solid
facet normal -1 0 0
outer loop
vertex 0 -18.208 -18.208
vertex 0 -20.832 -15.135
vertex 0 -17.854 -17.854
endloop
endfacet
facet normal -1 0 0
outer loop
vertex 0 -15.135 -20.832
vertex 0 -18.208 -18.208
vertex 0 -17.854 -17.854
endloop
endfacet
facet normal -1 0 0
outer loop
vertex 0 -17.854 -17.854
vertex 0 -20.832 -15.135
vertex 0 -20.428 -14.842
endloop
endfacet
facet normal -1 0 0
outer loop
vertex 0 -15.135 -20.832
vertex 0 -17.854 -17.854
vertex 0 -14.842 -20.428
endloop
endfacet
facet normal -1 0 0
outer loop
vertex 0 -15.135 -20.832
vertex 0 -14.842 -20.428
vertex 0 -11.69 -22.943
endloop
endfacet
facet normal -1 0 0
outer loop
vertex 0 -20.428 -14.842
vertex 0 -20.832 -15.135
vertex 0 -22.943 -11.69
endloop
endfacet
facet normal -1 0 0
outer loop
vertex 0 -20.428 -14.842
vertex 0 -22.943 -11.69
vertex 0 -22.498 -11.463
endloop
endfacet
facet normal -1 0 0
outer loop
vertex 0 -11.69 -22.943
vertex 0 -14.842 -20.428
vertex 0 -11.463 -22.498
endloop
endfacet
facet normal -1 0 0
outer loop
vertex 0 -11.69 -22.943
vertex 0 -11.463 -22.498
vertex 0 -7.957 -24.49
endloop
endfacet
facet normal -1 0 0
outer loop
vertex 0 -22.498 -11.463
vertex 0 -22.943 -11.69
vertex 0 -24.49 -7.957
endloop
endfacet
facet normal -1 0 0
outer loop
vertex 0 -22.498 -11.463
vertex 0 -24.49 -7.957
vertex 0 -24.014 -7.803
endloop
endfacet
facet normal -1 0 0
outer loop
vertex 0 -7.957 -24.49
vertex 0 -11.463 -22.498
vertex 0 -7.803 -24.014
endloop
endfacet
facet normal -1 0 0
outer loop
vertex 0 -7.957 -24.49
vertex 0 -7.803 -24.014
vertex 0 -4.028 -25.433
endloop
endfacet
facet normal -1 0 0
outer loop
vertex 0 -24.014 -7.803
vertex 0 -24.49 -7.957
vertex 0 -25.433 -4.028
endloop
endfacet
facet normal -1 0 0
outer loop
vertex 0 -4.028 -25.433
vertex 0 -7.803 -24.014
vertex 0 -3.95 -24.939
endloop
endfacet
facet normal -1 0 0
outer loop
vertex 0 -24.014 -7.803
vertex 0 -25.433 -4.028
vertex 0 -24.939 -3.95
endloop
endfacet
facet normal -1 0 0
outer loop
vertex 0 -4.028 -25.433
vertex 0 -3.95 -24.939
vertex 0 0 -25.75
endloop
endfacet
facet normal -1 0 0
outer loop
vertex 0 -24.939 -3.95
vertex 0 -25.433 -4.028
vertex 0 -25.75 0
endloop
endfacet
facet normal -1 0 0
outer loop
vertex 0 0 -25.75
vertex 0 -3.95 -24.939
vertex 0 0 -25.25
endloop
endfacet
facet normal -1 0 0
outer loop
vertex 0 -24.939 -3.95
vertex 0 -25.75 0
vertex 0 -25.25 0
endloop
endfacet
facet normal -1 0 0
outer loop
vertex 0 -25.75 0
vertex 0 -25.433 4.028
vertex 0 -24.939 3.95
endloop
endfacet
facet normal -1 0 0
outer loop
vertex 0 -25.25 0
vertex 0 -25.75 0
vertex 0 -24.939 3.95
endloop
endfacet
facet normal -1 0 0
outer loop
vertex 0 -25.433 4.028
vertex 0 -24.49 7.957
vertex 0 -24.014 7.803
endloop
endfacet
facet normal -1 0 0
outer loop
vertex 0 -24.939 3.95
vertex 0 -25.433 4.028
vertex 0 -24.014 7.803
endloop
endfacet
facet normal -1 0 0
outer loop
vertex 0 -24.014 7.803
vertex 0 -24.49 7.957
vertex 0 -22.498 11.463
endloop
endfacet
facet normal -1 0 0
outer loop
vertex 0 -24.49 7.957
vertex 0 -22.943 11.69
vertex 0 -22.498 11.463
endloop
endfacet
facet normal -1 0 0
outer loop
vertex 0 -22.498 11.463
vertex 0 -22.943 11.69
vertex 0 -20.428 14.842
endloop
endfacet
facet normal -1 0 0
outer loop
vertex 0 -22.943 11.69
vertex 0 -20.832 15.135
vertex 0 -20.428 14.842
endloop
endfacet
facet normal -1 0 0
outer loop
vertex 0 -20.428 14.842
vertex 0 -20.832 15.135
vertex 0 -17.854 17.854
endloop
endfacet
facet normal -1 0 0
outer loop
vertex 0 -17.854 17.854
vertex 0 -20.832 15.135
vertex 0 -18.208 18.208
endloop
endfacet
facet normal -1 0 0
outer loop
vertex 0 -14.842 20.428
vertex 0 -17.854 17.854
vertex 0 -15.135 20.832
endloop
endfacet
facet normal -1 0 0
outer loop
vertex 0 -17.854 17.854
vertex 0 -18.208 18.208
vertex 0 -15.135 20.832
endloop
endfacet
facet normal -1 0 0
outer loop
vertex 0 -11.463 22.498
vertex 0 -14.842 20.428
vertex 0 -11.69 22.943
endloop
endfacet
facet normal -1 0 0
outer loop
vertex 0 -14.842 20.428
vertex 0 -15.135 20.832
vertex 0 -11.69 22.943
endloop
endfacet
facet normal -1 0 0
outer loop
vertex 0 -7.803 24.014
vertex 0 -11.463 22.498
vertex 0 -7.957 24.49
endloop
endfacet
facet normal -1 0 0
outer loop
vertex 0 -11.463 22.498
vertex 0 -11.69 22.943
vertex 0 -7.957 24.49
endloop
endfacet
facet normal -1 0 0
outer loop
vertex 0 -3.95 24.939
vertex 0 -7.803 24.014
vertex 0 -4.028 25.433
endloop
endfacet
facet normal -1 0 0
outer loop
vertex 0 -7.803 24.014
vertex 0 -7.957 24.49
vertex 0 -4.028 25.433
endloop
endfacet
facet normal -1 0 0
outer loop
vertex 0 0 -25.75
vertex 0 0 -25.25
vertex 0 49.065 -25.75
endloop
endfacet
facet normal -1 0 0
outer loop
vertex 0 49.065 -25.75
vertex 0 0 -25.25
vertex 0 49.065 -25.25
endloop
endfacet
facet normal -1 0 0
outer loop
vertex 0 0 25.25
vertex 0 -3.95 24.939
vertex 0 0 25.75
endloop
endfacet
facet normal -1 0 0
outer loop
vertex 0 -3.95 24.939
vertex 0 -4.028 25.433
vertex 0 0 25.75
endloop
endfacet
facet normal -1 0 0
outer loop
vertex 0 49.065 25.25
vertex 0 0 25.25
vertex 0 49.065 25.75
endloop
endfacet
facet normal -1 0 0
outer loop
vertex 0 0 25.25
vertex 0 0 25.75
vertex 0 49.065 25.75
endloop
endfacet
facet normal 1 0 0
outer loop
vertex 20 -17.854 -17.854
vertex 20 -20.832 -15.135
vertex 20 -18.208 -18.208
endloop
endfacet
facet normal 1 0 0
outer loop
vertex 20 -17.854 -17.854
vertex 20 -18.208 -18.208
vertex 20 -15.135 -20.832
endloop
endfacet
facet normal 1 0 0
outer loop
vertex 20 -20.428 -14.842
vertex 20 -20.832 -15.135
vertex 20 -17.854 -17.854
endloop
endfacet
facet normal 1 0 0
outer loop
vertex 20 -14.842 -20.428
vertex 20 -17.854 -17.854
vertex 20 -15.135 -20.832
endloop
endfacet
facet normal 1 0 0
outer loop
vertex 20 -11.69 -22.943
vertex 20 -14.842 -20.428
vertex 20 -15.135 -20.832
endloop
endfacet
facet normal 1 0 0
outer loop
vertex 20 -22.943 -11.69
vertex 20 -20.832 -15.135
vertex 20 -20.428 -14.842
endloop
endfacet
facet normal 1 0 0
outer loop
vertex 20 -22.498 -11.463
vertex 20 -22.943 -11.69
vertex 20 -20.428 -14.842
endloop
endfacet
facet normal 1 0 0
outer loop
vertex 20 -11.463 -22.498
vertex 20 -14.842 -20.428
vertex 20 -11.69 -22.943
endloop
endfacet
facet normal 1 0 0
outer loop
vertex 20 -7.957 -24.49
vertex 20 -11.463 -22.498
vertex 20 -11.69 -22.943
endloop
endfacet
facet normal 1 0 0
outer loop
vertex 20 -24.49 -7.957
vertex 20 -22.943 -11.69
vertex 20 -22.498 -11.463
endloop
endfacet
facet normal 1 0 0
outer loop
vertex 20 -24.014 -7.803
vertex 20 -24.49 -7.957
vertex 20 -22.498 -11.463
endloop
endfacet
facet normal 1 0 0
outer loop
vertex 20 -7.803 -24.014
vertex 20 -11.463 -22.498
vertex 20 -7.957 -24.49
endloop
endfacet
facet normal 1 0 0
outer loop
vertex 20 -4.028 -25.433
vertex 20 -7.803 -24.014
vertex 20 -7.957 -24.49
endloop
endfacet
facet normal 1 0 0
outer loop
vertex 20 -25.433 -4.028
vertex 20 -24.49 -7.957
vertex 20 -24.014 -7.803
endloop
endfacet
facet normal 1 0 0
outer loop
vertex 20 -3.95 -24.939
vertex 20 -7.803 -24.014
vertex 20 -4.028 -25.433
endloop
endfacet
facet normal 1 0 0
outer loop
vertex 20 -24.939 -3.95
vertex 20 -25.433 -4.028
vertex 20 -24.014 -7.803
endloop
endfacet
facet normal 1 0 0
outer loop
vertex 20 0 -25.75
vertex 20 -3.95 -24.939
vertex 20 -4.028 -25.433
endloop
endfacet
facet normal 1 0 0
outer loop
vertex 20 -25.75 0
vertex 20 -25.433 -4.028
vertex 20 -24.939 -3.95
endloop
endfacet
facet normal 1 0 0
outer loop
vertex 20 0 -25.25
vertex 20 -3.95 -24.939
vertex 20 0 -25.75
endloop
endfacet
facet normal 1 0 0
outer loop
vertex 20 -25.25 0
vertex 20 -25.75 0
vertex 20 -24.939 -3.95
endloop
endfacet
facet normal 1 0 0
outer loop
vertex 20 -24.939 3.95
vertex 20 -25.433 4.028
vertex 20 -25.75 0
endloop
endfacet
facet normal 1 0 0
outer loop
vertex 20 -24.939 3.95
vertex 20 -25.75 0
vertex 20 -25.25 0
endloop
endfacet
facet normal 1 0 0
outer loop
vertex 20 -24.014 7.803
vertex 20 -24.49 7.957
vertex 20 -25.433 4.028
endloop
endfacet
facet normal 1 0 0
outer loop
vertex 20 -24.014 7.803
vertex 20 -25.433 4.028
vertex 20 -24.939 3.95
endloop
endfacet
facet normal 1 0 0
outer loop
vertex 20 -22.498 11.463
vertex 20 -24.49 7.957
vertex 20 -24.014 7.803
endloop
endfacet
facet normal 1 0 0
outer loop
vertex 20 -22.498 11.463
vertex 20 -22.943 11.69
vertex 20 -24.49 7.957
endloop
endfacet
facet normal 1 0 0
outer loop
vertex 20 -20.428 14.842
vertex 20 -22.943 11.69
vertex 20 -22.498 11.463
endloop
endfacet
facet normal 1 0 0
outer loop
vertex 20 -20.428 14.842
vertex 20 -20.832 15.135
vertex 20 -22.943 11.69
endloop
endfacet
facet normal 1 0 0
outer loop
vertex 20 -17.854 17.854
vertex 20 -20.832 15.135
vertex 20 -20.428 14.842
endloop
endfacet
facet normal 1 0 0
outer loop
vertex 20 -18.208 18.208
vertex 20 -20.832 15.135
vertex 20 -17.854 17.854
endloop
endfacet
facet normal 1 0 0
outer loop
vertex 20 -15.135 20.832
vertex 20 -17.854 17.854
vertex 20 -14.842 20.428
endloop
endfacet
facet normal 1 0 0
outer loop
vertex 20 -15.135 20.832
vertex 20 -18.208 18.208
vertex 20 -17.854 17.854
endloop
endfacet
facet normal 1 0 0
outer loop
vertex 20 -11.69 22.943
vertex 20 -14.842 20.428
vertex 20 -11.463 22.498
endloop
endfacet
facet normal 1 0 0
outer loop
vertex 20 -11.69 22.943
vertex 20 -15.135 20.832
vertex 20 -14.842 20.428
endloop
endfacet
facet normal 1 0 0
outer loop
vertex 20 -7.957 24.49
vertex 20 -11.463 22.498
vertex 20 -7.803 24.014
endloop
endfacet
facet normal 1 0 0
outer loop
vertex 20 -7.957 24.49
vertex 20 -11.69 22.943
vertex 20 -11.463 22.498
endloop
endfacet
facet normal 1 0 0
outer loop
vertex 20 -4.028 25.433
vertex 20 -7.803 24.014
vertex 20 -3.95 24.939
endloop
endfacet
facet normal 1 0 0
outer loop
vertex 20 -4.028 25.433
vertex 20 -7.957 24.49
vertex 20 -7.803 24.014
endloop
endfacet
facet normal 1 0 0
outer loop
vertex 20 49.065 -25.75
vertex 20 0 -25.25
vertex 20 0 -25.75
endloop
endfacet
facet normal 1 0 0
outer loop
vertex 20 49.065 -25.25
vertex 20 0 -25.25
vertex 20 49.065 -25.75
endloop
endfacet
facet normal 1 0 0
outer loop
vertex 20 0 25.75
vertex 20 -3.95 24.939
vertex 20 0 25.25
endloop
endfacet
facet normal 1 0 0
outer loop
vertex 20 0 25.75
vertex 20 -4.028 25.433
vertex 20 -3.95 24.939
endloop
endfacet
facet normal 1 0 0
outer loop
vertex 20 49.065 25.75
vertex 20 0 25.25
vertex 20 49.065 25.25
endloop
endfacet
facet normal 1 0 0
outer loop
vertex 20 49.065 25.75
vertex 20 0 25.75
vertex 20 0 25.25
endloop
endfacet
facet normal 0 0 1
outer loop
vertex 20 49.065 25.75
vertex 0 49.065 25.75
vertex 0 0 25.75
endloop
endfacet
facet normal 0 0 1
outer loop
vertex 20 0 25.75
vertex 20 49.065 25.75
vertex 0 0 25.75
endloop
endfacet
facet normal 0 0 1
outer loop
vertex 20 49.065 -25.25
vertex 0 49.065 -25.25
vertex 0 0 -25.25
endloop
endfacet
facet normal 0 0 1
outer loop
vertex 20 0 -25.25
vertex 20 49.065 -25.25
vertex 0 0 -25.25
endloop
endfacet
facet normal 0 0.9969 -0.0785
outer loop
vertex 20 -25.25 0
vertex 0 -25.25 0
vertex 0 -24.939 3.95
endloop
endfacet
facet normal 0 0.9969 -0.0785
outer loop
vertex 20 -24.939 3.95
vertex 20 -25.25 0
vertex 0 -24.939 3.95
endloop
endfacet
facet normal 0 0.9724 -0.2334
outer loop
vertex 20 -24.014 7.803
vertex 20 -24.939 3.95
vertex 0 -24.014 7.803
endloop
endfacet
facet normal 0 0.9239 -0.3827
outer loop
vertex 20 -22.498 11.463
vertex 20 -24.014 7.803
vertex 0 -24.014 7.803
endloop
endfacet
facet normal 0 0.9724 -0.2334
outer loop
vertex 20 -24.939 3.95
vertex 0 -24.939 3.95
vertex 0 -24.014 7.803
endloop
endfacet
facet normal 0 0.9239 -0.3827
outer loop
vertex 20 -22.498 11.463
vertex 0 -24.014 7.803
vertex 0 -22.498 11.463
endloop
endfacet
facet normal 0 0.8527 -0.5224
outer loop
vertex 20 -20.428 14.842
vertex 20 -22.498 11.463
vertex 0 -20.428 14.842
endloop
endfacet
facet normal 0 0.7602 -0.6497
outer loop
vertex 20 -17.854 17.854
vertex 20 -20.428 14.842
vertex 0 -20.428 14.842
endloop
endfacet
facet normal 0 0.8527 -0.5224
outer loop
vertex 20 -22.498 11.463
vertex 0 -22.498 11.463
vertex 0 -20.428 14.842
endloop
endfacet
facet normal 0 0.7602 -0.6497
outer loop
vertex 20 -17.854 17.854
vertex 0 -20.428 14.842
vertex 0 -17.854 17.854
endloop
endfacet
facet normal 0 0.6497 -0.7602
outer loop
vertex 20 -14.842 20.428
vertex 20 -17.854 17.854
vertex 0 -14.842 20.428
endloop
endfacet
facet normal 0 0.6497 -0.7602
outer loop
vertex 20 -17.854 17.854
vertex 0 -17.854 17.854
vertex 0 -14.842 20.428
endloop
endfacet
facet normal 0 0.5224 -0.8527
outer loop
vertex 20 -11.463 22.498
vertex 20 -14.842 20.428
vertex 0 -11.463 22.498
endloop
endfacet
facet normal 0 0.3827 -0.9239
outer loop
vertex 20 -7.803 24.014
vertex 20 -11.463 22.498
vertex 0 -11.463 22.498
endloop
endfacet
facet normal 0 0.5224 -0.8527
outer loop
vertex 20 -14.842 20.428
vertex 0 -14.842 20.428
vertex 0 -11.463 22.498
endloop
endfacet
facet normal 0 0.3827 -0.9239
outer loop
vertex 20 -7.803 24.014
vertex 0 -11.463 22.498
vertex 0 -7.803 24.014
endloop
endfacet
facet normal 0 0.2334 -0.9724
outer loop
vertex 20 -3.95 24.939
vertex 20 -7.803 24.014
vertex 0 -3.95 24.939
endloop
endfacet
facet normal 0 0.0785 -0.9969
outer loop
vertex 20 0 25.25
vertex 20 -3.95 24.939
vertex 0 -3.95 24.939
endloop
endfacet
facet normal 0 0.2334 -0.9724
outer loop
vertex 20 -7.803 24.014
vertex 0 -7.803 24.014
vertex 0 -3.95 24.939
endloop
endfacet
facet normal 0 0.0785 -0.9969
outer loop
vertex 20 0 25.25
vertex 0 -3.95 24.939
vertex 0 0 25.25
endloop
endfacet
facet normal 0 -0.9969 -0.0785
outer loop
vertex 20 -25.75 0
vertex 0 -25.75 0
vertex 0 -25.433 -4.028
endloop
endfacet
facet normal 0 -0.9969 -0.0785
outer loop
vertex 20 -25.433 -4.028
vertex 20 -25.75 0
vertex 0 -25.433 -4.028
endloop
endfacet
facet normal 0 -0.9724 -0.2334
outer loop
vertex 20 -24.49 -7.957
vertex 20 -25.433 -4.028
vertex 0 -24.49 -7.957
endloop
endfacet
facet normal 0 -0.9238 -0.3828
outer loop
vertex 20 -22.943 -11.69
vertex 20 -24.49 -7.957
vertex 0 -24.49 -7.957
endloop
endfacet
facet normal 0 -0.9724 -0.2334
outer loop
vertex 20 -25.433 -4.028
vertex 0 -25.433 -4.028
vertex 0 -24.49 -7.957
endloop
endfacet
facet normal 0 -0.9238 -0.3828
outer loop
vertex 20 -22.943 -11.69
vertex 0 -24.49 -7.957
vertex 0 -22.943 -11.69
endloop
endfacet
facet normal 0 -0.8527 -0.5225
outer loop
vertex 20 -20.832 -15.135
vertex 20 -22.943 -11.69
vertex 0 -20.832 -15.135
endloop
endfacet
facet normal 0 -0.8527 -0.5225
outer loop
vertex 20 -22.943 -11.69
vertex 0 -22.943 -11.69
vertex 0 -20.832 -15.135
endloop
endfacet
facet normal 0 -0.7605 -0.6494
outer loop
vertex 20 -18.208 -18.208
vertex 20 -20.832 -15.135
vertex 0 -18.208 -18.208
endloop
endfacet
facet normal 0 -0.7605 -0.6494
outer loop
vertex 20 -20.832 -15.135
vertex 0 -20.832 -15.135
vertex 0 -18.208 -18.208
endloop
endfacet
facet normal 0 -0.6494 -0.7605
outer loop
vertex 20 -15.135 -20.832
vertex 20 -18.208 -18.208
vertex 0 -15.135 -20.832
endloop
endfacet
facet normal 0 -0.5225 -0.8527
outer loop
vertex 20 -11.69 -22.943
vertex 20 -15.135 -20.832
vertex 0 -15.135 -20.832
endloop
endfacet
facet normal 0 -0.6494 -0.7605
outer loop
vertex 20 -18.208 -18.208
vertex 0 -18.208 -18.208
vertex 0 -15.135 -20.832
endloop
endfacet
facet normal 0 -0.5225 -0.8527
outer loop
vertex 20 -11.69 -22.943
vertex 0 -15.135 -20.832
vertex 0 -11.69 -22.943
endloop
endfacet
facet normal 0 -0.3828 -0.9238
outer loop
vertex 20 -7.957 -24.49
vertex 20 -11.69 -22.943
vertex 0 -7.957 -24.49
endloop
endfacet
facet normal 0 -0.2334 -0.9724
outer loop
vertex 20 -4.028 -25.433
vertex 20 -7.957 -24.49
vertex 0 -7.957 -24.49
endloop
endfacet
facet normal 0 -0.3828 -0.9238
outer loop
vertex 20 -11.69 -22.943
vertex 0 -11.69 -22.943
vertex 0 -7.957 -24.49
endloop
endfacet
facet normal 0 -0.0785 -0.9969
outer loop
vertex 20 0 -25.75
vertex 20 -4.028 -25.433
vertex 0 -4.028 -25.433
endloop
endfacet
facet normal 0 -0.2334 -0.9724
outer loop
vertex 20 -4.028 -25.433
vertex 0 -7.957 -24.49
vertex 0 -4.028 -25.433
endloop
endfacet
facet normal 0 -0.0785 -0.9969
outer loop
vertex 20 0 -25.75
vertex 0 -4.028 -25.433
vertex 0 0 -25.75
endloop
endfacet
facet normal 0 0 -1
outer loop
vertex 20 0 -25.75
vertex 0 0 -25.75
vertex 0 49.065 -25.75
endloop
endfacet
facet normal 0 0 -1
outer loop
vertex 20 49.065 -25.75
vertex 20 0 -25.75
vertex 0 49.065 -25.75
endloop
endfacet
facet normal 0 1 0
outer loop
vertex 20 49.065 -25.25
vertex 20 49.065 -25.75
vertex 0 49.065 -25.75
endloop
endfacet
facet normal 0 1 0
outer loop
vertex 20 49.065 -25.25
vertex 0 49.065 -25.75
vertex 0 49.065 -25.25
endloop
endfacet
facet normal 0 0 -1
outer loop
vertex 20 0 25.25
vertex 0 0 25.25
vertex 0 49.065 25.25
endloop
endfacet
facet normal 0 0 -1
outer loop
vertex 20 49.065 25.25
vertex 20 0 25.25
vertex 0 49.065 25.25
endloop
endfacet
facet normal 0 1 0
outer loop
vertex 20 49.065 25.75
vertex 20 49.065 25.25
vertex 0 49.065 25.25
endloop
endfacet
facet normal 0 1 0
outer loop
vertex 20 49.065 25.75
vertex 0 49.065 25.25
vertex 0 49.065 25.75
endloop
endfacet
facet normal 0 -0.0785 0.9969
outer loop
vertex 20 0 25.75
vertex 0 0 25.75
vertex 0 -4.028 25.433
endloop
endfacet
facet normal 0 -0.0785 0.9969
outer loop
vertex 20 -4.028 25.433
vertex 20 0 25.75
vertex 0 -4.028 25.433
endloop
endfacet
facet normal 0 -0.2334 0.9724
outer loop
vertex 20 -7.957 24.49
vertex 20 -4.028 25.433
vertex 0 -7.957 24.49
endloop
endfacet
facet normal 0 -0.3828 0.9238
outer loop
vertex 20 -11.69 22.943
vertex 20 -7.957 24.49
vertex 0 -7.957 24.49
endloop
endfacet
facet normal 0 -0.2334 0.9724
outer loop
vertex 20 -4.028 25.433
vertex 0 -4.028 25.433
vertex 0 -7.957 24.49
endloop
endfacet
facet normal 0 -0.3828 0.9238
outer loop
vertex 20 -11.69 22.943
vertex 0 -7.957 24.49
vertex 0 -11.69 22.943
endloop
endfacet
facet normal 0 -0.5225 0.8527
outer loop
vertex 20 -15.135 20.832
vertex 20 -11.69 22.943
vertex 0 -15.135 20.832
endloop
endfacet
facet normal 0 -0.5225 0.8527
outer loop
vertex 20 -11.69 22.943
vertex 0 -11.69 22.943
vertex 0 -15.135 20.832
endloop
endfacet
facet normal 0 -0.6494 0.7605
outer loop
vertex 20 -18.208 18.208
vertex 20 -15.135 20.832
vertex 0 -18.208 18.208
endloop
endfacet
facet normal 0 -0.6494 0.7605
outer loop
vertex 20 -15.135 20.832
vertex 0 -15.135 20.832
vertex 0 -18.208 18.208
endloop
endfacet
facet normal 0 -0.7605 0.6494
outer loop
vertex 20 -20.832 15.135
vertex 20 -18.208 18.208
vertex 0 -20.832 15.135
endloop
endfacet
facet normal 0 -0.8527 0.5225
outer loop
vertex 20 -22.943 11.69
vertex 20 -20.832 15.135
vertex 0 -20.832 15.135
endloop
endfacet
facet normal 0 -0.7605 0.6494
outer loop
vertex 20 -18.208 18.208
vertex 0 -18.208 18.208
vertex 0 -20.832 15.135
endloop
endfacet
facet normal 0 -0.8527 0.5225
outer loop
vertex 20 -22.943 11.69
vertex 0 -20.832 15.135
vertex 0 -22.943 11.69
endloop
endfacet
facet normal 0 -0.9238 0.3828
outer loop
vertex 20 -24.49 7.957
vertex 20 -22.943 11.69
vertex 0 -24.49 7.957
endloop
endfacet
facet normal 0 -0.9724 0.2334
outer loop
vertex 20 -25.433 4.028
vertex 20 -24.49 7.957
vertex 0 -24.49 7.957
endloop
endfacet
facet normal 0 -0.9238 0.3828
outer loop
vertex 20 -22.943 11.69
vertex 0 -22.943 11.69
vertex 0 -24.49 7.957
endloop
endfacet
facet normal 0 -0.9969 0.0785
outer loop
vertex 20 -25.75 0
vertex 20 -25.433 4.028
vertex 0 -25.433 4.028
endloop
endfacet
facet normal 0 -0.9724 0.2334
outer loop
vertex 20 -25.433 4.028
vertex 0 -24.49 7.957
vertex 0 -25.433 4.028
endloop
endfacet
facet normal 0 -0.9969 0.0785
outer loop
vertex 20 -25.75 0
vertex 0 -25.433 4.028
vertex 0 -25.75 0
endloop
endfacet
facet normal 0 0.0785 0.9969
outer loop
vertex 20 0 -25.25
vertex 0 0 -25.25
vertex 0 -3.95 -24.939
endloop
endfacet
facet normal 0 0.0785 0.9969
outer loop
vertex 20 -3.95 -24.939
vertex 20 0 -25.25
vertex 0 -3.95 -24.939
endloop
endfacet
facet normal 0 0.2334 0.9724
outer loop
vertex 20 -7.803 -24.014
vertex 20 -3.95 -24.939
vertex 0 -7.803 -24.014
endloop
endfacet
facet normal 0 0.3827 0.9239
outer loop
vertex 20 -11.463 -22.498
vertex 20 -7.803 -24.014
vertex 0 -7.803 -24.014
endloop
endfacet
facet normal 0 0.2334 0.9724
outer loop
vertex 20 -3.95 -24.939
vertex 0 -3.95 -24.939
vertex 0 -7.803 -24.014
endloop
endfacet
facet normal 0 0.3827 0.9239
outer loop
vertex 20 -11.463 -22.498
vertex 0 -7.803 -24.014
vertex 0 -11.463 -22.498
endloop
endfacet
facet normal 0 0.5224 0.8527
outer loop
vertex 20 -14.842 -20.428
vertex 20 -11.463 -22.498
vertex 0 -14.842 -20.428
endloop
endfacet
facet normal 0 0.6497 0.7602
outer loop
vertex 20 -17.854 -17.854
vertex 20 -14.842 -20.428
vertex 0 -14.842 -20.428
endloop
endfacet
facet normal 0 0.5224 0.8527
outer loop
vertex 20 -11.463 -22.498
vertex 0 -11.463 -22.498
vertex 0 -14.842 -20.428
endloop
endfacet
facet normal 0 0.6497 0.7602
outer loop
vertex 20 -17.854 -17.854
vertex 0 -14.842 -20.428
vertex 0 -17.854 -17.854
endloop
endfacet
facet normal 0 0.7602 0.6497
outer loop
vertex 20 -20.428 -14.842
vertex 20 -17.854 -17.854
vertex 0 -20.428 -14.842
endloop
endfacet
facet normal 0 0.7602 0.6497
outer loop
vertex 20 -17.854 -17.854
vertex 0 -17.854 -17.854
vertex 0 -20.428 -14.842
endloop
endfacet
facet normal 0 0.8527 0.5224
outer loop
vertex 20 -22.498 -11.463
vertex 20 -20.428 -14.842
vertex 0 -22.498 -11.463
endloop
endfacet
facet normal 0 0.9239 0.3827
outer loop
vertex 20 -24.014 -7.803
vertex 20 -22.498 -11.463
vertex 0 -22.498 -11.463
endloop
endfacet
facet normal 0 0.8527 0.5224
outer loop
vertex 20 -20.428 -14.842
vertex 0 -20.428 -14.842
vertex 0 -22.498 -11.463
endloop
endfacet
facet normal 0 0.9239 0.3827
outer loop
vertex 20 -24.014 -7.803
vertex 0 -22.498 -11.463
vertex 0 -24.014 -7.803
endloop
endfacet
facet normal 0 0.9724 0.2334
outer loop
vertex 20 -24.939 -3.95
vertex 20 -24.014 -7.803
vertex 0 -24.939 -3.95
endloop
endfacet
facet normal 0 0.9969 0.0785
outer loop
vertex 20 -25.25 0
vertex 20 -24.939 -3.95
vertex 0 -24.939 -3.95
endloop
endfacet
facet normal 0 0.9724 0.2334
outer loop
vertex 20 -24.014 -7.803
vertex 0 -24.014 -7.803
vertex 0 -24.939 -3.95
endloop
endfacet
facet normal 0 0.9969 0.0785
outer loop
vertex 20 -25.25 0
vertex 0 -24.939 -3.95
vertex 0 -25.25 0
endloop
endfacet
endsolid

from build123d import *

# Parameters (mm, degrees)
F4_DEPTH = 20


# Not quite as in the source:
# - a feature of the source that left no trace in its solid (it failed there, or was rolled back) is left out


with BuildPart() as f4:
    # F2 (on Right) → F4 (new body)
    with BuildSketch(Plane.YZ):
        with BuildLine():
            ThreePointArc((-25.25, 0), (-17.854446225, 17.854446225), (0, 25.25))
            Line((0, 25.25), (49.0651577711, 25.25))
            Line((49.0651577711, 25.25), (49.0651577711, 25.75))
            Line((49.0651577711, 25.75), (0, 25.75))
            ThreePointArc((0, 25.75), (-18.2079996156, 18.2079996156), (-25.75, 0))
            Line((-25.75, 0), (-25.25, 0))
        make_face()
        with BuildLine():
            ThreePointArc((0, -25.25), (-17.854446225, -17.854446225), (-25.25, 0))
            Line((-25.25, 0), (-25.75, 0))
            ThreePointArc((-25.75, 0), (-18.2079996156, -18.2079996156), (0, -25.75))
            Line((0, -25.75), (49.0651577711, -25.75))
            Line((49.0651577711, -25.75), (49.0651577711, -25.25))
            Line((49.0651577711, -25.25), (0, -25.25))
        make_face()
    extrude(amount=F4_DEPTH)


solid = f4.part
